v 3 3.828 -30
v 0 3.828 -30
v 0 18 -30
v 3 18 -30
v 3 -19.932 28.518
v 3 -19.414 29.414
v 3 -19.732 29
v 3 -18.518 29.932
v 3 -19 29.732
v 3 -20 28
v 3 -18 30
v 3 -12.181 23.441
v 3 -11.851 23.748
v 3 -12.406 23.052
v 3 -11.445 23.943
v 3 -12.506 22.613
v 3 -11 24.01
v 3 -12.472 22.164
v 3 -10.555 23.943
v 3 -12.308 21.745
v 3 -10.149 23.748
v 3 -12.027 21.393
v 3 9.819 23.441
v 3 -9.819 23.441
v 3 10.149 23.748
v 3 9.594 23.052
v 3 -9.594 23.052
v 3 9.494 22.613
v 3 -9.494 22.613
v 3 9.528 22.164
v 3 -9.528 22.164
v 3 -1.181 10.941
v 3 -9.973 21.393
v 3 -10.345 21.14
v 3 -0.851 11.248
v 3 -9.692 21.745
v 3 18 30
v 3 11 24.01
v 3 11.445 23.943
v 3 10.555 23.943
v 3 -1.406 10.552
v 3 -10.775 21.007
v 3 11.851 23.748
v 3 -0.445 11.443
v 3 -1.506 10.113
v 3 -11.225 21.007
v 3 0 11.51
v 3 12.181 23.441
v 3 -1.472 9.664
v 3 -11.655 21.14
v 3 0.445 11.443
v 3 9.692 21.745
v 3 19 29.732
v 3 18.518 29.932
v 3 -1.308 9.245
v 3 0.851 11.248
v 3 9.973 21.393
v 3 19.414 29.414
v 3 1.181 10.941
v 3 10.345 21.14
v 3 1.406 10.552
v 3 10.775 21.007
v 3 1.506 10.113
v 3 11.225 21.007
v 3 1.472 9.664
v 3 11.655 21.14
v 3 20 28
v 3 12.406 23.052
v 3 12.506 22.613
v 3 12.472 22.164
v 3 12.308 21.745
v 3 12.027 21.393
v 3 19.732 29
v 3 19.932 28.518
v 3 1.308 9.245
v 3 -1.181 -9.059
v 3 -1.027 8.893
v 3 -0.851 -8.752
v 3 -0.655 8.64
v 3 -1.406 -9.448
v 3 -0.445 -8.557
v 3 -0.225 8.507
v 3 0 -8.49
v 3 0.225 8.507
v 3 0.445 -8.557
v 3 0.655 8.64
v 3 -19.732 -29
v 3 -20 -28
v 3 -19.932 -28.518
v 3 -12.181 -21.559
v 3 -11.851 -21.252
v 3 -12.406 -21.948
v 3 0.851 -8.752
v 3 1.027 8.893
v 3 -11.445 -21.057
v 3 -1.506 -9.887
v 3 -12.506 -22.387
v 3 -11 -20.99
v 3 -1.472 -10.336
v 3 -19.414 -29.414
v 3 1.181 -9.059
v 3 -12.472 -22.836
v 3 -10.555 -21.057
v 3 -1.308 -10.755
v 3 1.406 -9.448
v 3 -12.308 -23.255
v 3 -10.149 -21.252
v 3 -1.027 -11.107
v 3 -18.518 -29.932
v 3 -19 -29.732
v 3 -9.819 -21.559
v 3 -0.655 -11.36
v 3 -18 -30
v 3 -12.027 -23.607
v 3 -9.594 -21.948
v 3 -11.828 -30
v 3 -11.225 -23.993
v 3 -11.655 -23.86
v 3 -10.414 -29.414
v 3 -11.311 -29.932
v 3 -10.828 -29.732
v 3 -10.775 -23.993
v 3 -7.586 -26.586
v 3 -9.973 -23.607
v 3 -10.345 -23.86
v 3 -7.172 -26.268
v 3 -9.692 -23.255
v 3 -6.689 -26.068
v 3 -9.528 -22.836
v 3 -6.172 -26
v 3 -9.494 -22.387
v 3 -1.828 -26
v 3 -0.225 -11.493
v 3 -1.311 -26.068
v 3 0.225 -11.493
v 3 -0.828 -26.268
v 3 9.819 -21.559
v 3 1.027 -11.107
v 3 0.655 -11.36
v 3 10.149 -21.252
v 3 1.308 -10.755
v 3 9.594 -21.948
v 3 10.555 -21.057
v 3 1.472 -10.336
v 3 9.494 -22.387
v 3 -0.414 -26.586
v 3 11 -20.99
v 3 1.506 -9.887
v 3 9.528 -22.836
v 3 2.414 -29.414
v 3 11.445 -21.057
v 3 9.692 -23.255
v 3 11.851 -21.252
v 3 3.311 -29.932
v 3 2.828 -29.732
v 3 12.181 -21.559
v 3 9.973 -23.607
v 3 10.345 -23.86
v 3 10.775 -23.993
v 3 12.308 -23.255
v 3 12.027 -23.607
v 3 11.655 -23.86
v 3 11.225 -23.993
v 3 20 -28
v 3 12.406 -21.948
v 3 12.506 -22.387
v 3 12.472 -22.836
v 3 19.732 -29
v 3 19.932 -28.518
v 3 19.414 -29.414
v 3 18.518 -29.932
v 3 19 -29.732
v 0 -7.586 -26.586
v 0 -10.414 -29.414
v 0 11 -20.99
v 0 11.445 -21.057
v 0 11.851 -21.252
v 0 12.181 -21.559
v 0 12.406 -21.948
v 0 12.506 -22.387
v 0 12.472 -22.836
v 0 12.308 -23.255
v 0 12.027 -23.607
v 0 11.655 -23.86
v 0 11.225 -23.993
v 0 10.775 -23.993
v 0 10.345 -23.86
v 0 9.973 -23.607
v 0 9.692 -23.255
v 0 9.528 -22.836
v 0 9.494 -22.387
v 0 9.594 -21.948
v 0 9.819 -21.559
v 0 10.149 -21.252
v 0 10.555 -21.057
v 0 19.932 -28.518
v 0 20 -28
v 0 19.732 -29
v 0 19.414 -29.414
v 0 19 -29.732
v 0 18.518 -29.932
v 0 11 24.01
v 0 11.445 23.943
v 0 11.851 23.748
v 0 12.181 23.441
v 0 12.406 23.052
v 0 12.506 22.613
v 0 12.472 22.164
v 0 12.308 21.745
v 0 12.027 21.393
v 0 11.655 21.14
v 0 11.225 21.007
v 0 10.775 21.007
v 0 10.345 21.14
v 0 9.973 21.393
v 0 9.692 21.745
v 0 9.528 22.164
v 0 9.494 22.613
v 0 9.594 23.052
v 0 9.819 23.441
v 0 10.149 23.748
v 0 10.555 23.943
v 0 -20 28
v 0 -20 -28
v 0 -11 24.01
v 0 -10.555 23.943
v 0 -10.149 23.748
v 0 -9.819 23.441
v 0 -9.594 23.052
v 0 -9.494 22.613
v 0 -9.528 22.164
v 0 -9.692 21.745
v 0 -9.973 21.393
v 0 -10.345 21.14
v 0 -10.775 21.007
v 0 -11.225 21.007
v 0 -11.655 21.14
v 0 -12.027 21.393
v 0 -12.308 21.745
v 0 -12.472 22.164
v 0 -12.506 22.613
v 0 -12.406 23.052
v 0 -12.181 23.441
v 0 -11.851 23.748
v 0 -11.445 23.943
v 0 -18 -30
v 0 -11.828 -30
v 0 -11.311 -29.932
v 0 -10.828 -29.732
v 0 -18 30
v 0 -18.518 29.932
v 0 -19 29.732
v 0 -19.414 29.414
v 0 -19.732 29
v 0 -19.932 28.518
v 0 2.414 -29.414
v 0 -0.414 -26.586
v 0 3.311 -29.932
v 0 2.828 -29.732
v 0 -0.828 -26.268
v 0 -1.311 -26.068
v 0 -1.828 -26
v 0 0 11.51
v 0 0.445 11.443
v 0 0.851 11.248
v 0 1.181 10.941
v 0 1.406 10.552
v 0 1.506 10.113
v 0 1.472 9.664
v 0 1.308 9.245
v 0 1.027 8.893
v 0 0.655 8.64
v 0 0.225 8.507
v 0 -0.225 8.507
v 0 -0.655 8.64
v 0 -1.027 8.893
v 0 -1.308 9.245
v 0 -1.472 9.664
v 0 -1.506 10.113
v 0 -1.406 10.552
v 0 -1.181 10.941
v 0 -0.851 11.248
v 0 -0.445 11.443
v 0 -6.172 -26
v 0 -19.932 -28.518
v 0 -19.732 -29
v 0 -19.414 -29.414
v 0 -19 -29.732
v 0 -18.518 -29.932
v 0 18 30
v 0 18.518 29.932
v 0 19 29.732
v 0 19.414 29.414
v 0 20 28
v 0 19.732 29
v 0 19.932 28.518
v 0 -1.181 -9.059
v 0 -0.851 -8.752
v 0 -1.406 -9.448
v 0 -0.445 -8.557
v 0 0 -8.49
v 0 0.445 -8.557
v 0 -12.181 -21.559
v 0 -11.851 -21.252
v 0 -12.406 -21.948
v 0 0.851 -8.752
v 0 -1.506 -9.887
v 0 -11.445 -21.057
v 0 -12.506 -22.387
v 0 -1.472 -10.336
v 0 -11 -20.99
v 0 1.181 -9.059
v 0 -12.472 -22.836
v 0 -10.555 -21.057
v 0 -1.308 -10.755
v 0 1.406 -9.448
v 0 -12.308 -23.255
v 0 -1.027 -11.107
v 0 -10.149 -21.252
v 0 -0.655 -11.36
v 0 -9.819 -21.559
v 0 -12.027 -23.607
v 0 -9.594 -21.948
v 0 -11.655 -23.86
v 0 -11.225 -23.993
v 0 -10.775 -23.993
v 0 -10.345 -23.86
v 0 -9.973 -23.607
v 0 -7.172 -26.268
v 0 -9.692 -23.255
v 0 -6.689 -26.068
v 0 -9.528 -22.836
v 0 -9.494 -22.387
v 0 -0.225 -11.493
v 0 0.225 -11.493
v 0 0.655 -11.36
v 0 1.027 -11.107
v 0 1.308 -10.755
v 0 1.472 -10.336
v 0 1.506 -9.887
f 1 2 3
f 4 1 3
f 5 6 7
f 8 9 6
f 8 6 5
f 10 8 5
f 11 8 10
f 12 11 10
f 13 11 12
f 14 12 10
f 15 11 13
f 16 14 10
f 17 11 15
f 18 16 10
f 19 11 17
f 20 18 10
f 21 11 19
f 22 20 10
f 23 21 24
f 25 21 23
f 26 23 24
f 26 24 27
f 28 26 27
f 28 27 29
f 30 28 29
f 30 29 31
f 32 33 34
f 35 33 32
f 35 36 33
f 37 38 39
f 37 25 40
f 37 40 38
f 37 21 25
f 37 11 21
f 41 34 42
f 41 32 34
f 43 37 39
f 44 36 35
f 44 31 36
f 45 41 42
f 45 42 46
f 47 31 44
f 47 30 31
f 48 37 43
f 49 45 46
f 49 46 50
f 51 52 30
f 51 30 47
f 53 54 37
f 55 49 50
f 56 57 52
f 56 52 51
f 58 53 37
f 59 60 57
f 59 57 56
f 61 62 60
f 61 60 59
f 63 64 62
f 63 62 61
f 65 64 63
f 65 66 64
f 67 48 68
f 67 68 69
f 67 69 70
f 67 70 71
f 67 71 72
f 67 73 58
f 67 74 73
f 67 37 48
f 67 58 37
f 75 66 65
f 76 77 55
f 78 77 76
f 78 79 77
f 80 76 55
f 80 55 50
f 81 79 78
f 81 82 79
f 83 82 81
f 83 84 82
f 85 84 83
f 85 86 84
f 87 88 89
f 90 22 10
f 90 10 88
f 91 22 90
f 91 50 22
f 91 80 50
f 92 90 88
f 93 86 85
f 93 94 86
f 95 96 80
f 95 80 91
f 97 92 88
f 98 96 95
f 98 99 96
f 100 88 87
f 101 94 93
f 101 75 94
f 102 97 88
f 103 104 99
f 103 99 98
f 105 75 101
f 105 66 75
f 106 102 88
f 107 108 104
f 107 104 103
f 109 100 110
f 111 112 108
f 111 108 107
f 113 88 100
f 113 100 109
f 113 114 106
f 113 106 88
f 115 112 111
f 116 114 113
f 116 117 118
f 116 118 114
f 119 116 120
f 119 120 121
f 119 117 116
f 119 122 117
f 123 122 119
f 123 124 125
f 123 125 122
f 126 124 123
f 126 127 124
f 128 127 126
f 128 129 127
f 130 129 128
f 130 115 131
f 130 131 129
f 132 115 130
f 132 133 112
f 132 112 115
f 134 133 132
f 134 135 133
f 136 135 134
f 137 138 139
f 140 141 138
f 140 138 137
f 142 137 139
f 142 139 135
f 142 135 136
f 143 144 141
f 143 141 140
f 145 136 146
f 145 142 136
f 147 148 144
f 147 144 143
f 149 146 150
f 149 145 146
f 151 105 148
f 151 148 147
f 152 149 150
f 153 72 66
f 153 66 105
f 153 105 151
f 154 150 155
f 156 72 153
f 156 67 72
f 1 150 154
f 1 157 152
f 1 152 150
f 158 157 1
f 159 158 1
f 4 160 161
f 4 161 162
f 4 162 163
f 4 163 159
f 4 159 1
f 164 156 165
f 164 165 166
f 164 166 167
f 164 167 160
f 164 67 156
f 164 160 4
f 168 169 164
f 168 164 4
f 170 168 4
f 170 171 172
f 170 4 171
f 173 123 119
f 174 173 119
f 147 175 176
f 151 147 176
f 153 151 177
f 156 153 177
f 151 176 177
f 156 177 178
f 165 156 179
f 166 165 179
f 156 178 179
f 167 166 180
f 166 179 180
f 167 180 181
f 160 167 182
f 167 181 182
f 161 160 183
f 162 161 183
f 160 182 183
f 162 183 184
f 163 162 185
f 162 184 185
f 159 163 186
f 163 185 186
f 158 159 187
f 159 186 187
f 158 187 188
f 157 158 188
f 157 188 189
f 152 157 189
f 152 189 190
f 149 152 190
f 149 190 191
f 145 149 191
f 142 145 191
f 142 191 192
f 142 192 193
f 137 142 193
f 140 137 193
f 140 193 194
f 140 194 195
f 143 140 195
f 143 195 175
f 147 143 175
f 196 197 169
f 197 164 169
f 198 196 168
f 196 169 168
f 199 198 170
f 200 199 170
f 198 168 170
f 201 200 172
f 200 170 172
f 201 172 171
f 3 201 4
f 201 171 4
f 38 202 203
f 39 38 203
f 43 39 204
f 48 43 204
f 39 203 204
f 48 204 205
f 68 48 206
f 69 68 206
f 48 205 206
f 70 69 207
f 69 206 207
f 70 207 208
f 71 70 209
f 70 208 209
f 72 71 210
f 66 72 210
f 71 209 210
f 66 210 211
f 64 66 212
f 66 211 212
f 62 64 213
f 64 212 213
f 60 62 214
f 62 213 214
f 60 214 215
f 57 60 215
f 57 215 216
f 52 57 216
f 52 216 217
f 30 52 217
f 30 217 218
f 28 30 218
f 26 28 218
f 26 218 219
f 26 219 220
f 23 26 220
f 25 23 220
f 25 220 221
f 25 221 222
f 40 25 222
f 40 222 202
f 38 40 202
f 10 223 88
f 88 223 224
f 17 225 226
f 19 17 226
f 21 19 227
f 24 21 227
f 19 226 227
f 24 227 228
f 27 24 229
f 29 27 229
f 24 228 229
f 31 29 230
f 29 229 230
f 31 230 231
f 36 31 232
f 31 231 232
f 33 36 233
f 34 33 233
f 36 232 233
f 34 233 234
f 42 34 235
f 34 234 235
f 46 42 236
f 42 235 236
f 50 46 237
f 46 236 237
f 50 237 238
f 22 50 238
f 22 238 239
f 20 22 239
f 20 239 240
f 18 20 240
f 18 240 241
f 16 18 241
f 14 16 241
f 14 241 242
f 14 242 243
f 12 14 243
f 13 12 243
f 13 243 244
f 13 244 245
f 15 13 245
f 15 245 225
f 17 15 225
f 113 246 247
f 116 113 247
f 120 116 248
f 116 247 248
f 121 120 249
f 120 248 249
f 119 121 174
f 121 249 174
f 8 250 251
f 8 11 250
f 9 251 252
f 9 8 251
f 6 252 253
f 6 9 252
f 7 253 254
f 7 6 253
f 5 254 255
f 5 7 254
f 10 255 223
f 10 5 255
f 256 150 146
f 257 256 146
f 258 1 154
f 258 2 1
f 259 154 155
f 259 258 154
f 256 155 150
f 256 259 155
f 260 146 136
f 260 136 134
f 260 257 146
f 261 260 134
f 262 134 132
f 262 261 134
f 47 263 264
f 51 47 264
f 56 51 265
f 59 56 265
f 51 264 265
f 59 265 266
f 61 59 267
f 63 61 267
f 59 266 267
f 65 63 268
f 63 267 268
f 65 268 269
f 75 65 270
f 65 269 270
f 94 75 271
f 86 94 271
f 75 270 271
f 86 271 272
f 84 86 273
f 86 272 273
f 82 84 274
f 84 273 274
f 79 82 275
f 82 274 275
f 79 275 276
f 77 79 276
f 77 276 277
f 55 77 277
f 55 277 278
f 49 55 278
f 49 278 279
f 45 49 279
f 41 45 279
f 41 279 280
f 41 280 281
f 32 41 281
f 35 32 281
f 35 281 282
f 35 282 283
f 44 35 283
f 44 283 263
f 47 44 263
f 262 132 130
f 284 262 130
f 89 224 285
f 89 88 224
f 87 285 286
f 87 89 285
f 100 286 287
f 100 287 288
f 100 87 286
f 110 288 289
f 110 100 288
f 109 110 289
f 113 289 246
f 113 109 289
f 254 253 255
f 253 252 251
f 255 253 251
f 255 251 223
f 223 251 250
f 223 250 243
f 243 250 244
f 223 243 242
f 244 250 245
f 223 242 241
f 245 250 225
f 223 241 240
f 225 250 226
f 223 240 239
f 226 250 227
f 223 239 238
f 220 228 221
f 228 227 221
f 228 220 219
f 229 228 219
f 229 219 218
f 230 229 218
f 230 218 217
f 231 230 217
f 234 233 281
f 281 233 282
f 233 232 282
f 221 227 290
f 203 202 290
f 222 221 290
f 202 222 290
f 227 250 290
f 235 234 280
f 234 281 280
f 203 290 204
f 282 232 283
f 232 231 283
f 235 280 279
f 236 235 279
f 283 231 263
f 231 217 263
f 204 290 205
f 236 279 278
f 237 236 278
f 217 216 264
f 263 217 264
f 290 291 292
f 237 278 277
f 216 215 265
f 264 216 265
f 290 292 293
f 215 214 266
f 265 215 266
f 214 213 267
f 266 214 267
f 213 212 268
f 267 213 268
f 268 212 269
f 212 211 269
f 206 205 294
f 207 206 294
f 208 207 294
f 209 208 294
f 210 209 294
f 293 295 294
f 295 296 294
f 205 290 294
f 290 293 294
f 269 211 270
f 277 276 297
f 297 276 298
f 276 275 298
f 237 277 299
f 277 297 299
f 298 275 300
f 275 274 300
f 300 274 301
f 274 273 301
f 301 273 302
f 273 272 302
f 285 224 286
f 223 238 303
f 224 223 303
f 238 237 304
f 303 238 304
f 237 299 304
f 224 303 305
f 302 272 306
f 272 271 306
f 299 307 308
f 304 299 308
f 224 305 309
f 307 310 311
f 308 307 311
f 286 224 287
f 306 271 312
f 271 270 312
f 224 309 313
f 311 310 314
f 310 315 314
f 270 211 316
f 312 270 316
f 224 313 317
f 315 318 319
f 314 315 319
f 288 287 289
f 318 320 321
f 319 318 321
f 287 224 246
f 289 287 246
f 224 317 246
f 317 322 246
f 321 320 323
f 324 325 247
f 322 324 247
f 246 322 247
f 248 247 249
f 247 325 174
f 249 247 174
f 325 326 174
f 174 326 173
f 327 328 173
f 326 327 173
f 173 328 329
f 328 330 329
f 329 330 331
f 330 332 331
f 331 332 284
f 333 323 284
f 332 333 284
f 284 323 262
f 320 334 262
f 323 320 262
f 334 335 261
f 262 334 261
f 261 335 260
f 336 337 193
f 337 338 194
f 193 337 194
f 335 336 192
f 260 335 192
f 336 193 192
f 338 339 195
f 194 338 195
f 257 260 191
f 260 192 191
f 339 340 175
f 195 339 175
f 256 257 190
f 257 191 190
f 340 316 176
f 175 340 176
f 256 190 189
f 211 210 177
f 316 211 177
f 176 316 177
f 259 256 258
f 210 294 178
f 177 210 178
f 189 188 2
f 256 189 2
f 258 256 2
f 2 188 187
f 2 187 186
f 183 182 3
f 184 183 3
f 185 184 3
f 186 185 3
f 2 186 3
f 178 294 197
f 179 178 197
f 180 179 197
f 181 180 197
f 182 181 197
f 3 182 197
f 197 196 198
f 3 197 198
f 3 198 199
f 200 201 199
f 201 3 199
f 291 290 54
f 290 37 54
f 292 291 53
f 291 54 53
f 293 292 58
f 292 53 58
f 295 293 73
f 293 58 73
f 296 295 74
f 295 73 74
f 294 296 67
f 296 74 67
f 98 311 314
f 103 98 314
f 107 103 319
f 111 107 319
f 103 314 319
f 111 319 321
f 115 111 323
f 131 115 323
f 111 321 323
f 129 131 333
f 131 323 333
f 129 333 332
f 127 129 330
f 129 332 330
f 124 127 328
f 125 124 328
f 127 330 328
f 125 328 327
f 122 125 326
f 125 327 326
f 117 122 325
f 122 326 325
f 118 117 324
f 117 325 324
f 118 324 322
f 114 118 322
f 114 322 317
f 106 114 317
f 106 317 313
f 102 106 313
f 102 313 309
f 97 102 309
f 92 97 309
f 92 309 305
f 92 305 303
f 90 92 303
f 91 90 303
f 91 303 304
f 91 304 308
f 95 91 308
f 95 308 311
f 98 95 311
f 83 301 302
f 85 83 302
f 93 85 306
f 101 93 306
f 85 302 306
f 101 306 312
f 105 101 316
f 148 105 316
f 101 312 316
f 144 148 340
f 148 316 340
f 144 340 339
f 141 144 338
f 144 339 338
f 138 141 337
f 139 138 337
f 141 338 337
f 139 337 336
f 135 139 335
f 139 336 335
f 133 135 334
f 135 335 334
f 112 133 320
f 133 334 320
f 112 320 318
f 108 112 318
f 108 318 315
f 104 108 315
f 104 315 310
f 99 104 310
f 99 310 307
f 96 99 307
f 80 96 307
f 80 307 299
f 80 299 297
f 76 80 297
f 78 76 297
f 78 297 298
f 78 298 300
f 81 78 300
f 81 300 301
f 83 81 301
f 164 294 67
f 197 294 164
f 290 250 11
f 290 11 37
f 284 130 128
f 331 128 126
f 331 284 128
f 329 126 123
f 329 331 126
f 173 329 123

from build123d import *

# Parameters (mm, degrees)
SKETCH_1_W          = 60
SKETCH_1_H          = 40
EXTRUDE_1_DEPTH     = 3
SKETCH_2_R          = 1.51
CUT_EXTRUDE_1_DEPTH = 10
SKETCH_3_R          = 1.51
CUT_EXTRUDE_2_DEPTH = 10
CUT_EXTRUDE_3_DEPTH = 10
FILLET_1_R          = 2


with BuildPart() as part:
    # 草图1 → 凸台-拉伸1 (new body)
    with BuildSketch(Plane(origin=(0, 0, 0), x_dir=(0, 0, -1), z_dir=(1, 0, 0))):
        Rectangle(SKETCH_1_W, SKETCH_1_H)
    extrude(amount=EXTRUDE_1_DEPTH)

    # 草图2 → 切除-拉伸1 (cut)
    with BuildSketch(Plane.ZY):
        with Locations((-22.5, -11)):
            Circle(SKETCH_2_R)
        with Locations((22.5, -11)):
            Circle(SKETCH_2_R)
        with Locations((22.5, 11)):
            Circle(SKETCH_2_R)
        with Locations((-22.5, 11)):
            Circle(SKETCH_2_R)
    extrude(amount=-CUT_EXTRUDE_1_DEPTH, mode=Mode.SUBTRACT)

    # 草图3 → 切除-拉伸2 (cut)
    with BuildSketch(Plane.ZY):
        with Locations((10, 0)):
            Circle(SKETCH_3_R)
        with Locations((-10, 0)):
            Circle(SKETCH_3_R)
    extrude(amount=-CUT_EXTRUDE_2_DEPTH, mode=Mode.SUBTRACT)

    # 草图4 → 切除-拉伸3 (cut)
    with BuildSketch(Plane(origin=(3, 0, 0), x_dir=(0, 0, -1), z_dir=(1, 0, 0))):
        Polygon((26, -7), (30, -11), (30, 3), (26, -1), align=None)
    extrude(amount=-CUT_EXTRUDE_3_DEPTH, mode=Mode.SUBTRACT)

    # 圆角1
    fillet_1_edges = [part.edges().sort_by_distance(p)[0] for p in [
        (1.5, -1, -26),
        (1.5, 3, -30),
        (1.5, -11, -30),
        (1.5, -7, -26),
        (1.5, -20, -30),
        (1.5, -20, 30),
        (1.5, 20, 30),
        (1.5, 20, -30),
    ]]
    fillet(fillet_1_edges, radius=FILLET_1_R)


solid = part.part
